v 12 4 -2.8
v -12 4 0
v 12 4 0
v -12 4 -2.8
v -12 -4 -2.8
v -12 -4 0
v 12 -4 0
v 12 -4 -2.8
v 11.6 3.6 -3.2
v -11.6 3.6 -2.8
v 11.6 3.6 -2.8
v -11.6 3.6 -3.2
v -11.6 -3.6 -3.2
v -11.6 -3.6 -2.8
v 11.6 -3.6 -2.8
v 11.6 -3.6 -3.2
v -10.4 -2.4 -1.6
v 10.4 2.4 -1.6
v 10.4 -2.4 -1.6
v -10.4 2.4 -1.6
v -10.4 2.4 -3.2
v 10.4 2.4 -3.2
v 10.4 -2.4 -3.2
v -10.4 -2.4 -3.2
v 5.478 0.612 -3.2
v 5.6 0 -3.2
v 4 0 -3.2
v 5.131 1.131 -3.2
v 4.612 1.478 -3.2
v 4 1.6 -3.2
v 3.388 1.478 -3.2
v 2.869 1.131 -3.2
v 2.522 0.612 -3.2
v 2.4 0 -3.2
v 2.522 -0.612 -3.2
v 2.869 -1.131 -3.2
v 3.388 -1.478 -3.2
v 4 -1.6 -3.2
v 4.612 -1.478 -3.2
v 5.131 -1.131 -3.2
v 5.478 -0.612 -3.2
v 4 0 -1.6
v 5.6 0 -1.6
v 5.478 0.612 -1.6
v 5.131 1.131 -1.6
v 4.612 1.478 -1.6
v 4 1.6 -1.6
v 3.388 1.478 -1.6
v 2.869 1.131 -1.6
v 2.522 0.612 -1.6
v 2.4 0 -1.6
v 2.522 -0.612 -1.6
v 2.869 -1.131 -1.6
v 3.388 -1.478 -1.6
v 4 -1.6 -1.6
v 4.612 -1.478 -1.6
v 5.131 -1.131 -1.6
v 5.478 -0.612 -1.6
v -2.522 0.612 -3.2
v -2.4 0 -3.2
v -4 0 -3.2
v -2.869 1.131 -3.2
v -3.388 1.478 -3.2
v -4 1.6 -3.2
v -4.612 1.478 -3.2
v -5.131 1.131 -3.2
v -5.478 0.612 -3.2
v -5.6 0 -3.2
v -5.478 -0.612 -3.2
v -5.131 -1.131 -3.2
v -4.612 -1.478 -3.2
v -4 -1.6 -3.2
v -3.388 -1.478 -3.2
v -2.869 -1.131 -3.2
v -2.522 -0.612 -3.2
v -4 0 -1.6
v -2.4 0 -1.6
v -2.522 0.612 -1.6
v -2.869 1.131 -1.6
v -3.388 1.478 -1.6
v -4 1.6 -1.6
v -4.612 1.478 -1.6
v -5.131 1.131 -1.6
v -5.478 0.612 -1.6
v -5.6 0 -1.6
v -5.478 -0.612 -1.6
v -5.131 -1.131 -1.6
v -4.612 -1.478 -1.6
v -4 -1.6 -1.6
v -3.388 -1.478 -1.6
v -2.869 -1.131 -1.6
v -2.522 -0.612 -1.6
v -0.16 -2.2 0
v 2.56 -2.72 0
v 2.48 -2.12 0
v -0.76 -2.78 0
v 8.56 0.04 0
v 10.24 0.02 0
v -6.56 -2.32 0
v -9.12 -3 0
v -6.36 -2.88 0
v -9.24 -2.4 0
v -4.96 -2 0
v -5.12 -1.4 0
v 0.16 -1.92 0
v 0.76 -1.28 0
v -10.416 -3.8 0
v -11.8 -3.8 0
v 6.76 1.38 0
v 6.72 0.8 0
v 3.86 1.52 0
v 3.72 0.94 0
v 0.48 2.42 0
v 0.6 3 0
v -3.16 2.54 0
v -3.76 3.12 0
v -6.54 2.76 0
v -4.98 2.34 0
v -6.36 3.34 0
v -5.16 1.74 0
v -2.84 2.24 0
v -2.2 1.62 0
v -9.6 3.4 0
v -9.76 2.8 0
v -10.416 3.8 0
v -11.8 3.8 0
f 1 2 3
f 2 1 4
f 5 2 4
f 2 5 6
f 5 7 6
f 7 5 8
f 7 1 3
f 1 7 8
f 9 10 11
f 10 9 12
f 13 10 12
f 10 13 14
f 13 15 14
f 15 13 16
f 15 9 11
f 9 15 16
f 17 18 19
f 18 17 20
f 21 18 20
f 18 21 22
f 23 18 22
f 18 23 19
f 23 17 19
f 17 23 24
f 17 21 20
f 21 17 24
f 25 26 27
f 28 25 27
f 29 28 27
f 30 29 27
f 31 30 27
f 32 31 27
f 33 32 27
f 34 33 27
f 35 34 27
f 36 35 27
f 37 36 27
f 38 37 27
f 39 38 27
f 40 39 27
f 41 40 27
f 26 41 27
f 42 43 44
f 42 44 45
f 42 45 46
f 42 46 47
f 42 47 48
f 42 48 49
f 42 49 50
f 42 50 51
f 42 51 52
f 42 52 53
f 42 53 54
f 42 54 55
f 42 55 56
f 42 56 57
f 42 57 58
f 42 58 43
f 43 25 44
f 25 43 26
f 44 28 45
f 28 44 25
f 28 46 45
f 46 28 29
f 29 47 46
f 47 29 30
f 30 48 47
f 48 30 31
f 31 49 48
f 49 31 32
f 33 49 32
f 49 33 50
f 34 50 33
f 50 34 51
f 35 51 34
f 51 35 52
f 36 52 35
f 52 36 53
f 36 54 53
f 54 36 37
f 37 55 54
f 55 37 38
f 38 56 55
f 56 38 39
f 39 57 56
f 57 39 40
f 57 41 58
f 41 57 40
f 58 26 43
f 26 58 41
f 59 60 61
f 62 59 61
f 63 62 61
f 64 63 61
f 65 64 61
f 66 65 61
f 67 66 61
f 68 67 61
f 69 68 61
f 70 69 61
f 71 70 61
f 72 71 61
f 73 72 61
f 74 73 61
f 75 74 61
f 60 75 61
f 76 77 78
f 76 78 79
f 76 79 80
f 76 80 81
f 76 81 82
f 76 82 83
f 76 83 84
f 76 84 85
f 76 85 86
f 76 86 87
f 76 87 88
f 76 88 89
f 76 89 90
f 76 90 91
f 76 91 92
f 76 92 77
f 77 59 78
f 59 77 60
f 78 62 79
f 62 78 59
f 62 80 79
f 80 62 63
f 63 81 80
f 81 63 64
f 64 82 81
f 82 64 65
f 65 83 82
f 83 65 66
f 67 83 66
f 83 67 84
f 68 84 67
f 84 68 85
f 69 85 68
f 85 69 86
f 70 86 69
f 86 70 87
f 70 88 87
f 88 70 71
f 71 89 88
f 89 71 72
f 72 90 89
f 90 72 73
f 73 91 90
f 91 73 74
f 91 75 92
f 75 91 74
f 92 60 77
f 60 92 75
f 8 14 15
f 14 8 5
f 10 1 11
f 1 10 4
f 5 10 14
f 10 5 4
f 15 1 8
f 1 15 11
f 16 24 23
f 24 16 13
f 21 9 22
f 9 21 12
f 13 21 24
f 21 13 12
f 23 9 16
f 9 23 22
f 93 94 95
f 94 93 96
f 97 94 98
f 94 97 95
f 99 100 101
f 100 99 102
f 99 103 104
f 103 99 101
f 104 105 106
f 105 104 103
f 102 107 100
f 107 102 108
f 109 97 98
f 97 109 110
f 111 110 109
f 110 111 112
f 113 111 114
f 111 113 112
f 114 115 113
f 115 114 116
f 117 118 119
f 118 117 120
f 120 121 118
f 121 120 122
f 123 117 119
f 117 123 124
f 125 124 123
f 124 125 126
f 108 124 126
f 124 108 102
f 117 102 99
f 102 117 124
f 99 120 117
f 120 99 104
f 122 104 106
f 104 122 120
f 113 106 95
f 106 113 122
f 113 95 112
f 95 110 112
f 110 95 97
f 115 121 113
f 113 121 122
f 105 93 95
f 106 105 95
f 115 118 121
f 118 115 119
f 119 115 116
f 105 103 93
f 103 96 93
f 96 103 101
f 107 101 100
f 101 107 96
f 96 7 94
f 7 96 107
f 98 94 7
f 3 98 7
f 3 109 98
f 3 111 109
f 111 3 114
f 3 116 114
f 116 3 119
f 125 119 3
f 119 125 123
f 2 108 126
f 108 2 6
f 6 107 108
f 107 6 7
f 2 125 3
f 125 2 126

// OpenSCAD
// file: ../p/4-4edge.scad
use <../lib.scad>
function ldraw_lib__4_4edge() = [
// 0 Circle 1.0
// 0 Name: 4-4edge.dat
// 0 Author: James Jessiman
// 0 !LDRAW_ORG Primitive UPDATE 2017-01
// 0 !LICENSE Licensed under CC BY 2.0 and CC BY 4.0 : see CAreadme.txt
// 
// 0 BFC CERTIFY CCW
  [0,"BFC","CERTIFY"],
  [0,"BFC","CCW"],
// 
// 0 !HISTORY 1998-12-15 [PTadmin] Official Update 1998-10
// 0 !HISTORY 2005-12-28 [PTadmin] Official Update 2005-01
// 0 !HISTORY 2007-06-24 [PTadmin] Header formatted for Contributor Agreement
// 0 !HISTORY 2008-07-01 [PTadmin] Official Update 2008-01
// 0 !HISTORY 2017-01-15 [Steffen] BFCed
// 0 !HISTORY 2017-12-30 [PTadmin] Official Update 2017-01
// 
// 
// 2 24 1 0 0 0.9239 0 0.3827
  [2,24,1,0,0,0.9239,0,0.3827],
// 2 24 0.9239 0 0.3827 0.7071 0 0.7071
  [2,24,0.9239,0,0.3827,0.7071,0,0.7071],
// 2 24 0.7071 0 0.7071 0.3827 0 0.9239
  [2,24,0.7071,0,0.7071,0.3827,0,0.9239],
// 2 24 0.3827 0 0.9239 0 0 1
  [2,24,0.3827,0,0.9239,0,0,1],
// 2 24 0 0 1 -0.3827 0 0.9239
  [2,24,0,0,1,-0.3827,0,0.9239],
// 2 24 -0.3827 0 0.9239 -0.7071 0 0.7071
  [2,24,-0.3827,0,0.9239,-0.7071,0,0.7071],
// 2 24 -0.7071 0 0.7071 -0.9239 0 0.3827
  [2,24,-0.7071,0,0.7071,-0.9239,0,0.3827],
// 2 24 -0.9239 0 0.3827 -1 0 -0
  [2,24,-0.9239,0,0.3827,-1,0,-0],
// 2 24 -1 0 -0 -0.9239 0 -0.3827
  [2,24,-1,0,-0,-0.9239,0,-0.3827],
// 2 24 -0.9239 0 -0.3827 -0.7071 0 -0.7071
  [2,24,-0.9239,0,-0.3827,-0.7071,0,-0.7071],
// 2 24 -0.7071 0 -0.7071 -0.3827 0 -0.9239
  [2,24,-0.7071,0,-0.7071,-0.3827,0,-0.9239],
// 2 24 -0.3827 0 -0.9239 0 0 -1
  [2,24,-0.3827,0,-0.9239,0,0,-1],
// 2 24 0 0 -1 0.3827 0 -0.9239
  [2,24,0,0,-1,0.3827,0,-0.9239],
// 2 24 0.3827 0 -0.9239 0.7071 0 -0.7071
  [2,24,0.3827,0,-0.9239,0.7071,0,-0.7071],
// 2 24 0.7071 0 -0.7071 0.9239 0 -0.3827
  [2,24,0.7071,0,-0.7071,0.9239,0,-0.3827],
// 2 24 0.9239 0 -0.3827 1 0 0
  [2,24,0.9239,0,-0.3827,1,0,0],
];
module ldraw_lib__4_4edge(step=0, col=false, unit=2/5, alt=false, line=0.2, solid=!$preview)
    makepoly(ldraw_lib__4_4edge(), step=step, col=col, unit=unit, alt=alt, line=line, solid=solid);
ldraw_lib__4_4edge(line=0.2);
// file: ../p/4-4disc.scad
use <../lib.scad>
function ldraw_lib__4_4disc() = [
// 0 Disc 1.0
// 0 Name: 4-4disc.dat
// 0 Author: James Jessiman
// 0 !LDRAW_ORG Primitive UPDATE 2002-02
// 0 !LICENSE Licensed under CC BY 2.0 and CC BY 4.0 : see CAreadme.txt
// 
// 0 BFC CERTIFY CCW
  [0,"BFC","CERTIFY"],
  [0,"BFC","CCW"],
// 
// 0 !HISTORY 1998-12-15 [PTadmin] Official Update 1998-10
// 0 !HISTORY 2002-03-23 [sbliss] Added BFC statement
// 0 !HISTORY 2002-04-25 [PTadmin] Official Update 2002-02
// 0 !HISTORY 2007-06-24 [PTadmin] Header formatted for Contributor Agreement
// 0 !HISTORY 2008-07-01 [PTadmin] Official Update 2008-01
// 
// 
// 3 16 0 0 0 1 0 0 0.9239 0 0.3827
  [3,16,0,0,0,1,0,0,0.9239,0,0.3827],
// 3 16 0 0 0 0.9239 0 0.3827 0.7071 0 0.7071
  [3,16,0,0,0,0.9239,0,0.3827,0.7071,0,0.7071],
// 3 16 0 0 0 0.7071 0 0.7071 0.3827 0 0.9239
  [3,16,0,0,0,0.7071,0,0.7071,0.3827,0,0.9239],
// 3 16 0 0 0 0.3827 0 0.9239 0 0 1
  [3,16,0,0,0,0.3827,0,0.9239,0,0,1],
// 3 16 0 0 0 0 0 1 -0.3827 0 0.9239
  [3,16,0,0,0,0,0,1,-0.3827,0,0.9239],
// 3 16 0 0 0 -0.3827 0 0.9239 -0.7071 0 0.7071
  [3,16,0,0,0,-0.3827,0,0.9239,-0.7071,0,0.7071],
// 3 16 0 0 0 -0.7071 0 0.7071 -0.9239 0 0.3827
  [3,16,0,0,0,-0.7071,0,0.7071,-0.9239,0,0.3827],
// 3 16 0 0 0 -0.9239 0 0.3827 -1 0 -0
  [3,16,0,0,0,-0.9239,0,0.3827,-1,0,-0],
// 3 16 0 0 0 -1 0 -0 -0.9239 0 -0.3827
  [3,16,0,0,0,-1,0,-0,-0.9239,0,-0.3827],
// 3 16 0 0 0 -0.9239 0 -0.3827 -0.7071 0 -0.7071
  [3,16,0,0,0,-0.9239,0,-0.3827,-0.7071,0,-0.7071],
// 3 16 0 0 0 -0.7071 0 -0.7071 -0.3827 0 -0.9239
  [3,16,0,0,0,-0.7071,0,-0.7071,-0.3827,0,-0.9239],
// 3 16 0 0 0 -0.3827 0 -0.9239 0 0 -1
  [3,16,0,0,0,-0.3827,0,-0.9239,0,0,-1],
// 3 16 0 0 0 0 0 -1 0.3827 0 -0.9239
  [3,16,0,0,0,0,0,-1,0.3827,0,-0.9239],
// 3 16 0 0 0 0.3827 0 -0.9239 0.7071 0 -0.7071
  [3,16,0,0,0,0.3827,0,-0.9239,0.7071,0,-0.7071],
// 3 16 0 0 0 0.7071 0 -0.7071 0.9239 0 -0.3827
  [3,16,0,0,0,0.7071,0,-0.7071,0.9239,0,-0.3827],
// 3 16 0 0 0 0.9239 0 -0.3827 1 0 0
  [3,16,0,0,0,0.9239,0,-0.3827,1,0,0],
// 0
];
module ldraw_lib__4_4disc(step=0, col=false, unit=2/5, alt=false, line=0.2, solid=!$preview)
    makepoly(ldraw_lib__4_4disc(), step=step, col=col, unit=unit, alt=alt, line=line, solid=solid);
ldraw_lib__4_4disc(line=0.2);
// file: ../p/4-4cyli.scad
use <../lib.scad>
$fa=1; $fs=0.2;
function ldraw_lib__4_4cyli(realsolid=false) = [
// 0 Cylinder 1.0
// 0 Name: 4-4cyli.dat
// 0 Author: James Jessiman
// 0 !LDRAW_ORG Primitive UPDATE 2005-01
// 0 !LICENSE Licensed under CC BY 2.0 and CC BY 4.0 : see CAreadme.txt
// 
// 0 BFC CERTIFY CCW
  [0,"BFC","CERTIFY"],
  [0,"BFC","CCW"],
// 
// 0 !HISTORY 1998-12-15 [PTadmin] Official Update 1998-10
// 0 !HISTORY 2002-03-23 [sbliss] Added BFC statement; merged headers from files in distributions LDraw 0.27 and Complete.
// 0 !HISTORY 2002-04-25 [PTadmin] Official Update 2002-02
// 0 !HISTORY 2004-12-14 [guyvivan] BFC CCW
// 0 !HISTORY 2005-12-28 [PTadmin] Official Update 2005-01
// 0 !HISTORY 2007-06-24 [PTadmin] Header formatted for Contributor Agreement
// 0 !HISTORY 2008-07-01 [PTadmin] Official Update 2008-01
// 
// 
// 4 16 1 1 0 0.9239 1 0.3827 0.9239 0 0.3827 1 0 0
  [4,16,1,1,0,0.9239,1,0.3827,0.9239,0,0.3827,1,0,0],
// 5 24 1 0 0 1 1 0 0.9239 0 0.3827 0.9239 0 -0.3827
  [5,24,1,0,0,1,1,0,0.9239,0,0.3827,0.9239,0,-0.3827],
// 4 16 0.9239 1 0.3827 0.7071 1 0.7071 0.7071 0 0.7071 0.9239 0 0.3827
  [4,16,0.9239,1,0.3827,0.7071,1,0.7071,0.7071,0,0.7071,0.9239,0,0.3827],
// 5 24 0.9239 0 0.3827 0.9239 1 0.3827 0.7071 0 0.7071 1 0 0
  [5,24,0.9239,0,0.3827,0.9239,1,0.3827,0.7071,0,0.7071,1,0,0],
// 4 16 0.7071 1 0.7071 0.3827 1 0.9239 0.3827 0 0.9239 0.7071 0 0.7071
  [4,16,0.7071,1,0.7071,0.3827,1,0.9239,0.3827,0,0.9239,0.7071,0,0.7071],
// 5 24 0.7071 0 0.7071 0.7071 1 0.7071 0.3827 0 0.9239 0.9239 0 0.3827
  [5,24,0.7071,0,0.7071,0.7071,1,0.7071,0.3827,0,0.9239,0.9239,0,0.3827],
// 4 16 0.3827 1 0.9239 0 1 1 0 0 1 0.3827 0 0.9239
  [4,16,0.3827,1,0.9239,0,1,1,0,0,1,0.3827,0,0.9239],
// 5 24 0.3827 0 0.9239 0.3827 1 0.9239 0 0 1 0.7071 0 0.7071
  [5,24,0.3827,0,0.9239,0.3827,1,0.9239,0,0,1,0.7071,0,0.7071],
// 4 16 0 1 1 -0.3827 1 0.9239 -0.3827 0 0.9239 0 0 1
  [4,16,0,1,1,-0.3827,1,0.9239,-0.3827,0,0.9239,0,0,1],
// 5 24 0 0 1 0 1 1 -0.3827 0 0.9239 0.3827 0 0.9239
  [5,24,0,0,1,0,1,1,-0.3827,0,0.9239,0.3827,0,0.9239],
// 4 16 -0.3827 1 0.9239 -0.7071 1 0.7071 -0.7071 0 0.7071 -0.3827 0 0.9239
  [4,16,-0.3827,1,0.9239,-0.7071,1,0.7071,-0.7071,0,0.7071,-0.3827,0,0.9239],
// 5 24 -0.3827 0 0.9239 -0.3827 1 0.9239 -0.7071 0 0.7071 0 0 1
  [5,24,-0.3827,0,0.9239,-0.3827,1,0.9239,-0.7071,0,0.7071,0,0,1],
// 4 16 -0.7071 1 0.7071 -0.9239 1 0.3827 -0.9239 0 0.3827 -0.7071 0 0.7071
  [4,16,-0.7071,1,0.7071,-0.9239,1,0.3827,-0.9239,0,0.3827,-0.7071,0,0.7071],
// 5 24 -0.7071 0 0.7071 -0.7071 1 0.7071 -0.9239 0 0.3827 -0.3827 0 0.9239
  [5,24,-0.7071,0,0.7071,-0.7071,1,0.7071,-0.9239,0,0.3827,-0.3827,0,0.9239],
// 4 16 -0.9239 1 0.3827 -1 1 0 -1 0 0 -0.9239 0 0.3827
  [4,16,-0.9239,1,0.3827,-1,1,0,-1,0,0,-0.9239,0,0.3827],
// 5 24 -0.9239 0 0.3827 -0.9239 1 0.3827 -1 0 0 -0.7071 0 0.7071
  [5,24,-0.9239,0,0.3827,-0.9239,1,0.3827,-1,0,0,-0.7071,0,0.7071],
// 4 16 -1 1 0 -0.9239 1 -0.3827 -0.9239 0 -0.3827 -1 0 0
  [4,16,-1,1,0,-0.9239,1,-0.3827,-0.9239,0,-0.3827,-1,0,0],
// 5 24 -1 0 0 -1 1 0 -0.9239 0 -0.3827 -0.9239 0 0.3827
  [5,24,-1,0,0,-1,1,0,-0.9239,0,-0.3827,-0.9239,0,0.3827],
// 4 16 -0.9239 1 -0.3827 -0.7071 1 -0.7071 -0.7071 0 -0.7071 -0.9239 0 -0.3827
  [4,16,-0.9239,1,-0.3827,-0.7071,1,-0.7071,-0.7071,0,-0.7071,-0.9239,0,-0.3827],
// 5 24 -0.9239 0 -0.3827 -0.9239 1 -0.3827 -0.7071 0 -0.7071 -1 0 0
  [5,24,-0.9239,0,-0.3827,-0.9239,1,-0.3827,-0.7071,0,-0.7071,-1,0,0],
// 4 16 -0.7071 1 -0.7071 -0.3827 1 -0.9239 -0.3827 0 -0.9239 -0.7071 0 -0.7071
  [4,16,-0.7071,1,-0.7071,-0.3827,1,-0.9239,-0.3827,0,-0.9239,-0.7071,0,-0.7071],
// 5 24 -0.7071 0 -0.7071 -0.7071 1 -0.7071 -0.3827 0 -0.9239 -0.9239 0 -0.3827
  [5,24,-0.7071,0,-0.7071,-0.7071,1,-0.7071,-0.3827,0,-0.9239,-0.9239,0,-0.3827],
// 4 16 -0.3827 1 -0.9239 0 1 -1 0 0 -1 -0.3827 0 -0.9239
  [4,16,-0.3827,1,-0.9239,0,1,-1,0,0,-1,-0.3827,0,-0.9239],
// 5 24 -0.3827 0 -0.9239 -0.3827 1 -0.9239 0 0 -1 -0.7071 0 -0.7071
  [5,24,-0.3827,0,-0.9239,-0.3827,1,-0.9239,0,0,-1,-0.7071,0,-0.7071],
// 4 16 0 1 -1 0.3827 1 -0.9239 0.3827 0 -0.9239 0 0 -1
  [4,16,0,1,-1,0.3827,1,-0.9239,0.3827,0,-0.9239,0,0,-1],
// 5 24 0 0 -1 0 1 -1 0.3827 0 -0.9239 -0.3827 0 -0.9239
  [5,24,0,0,-1,0,1,-1,0.3827,0,-0.9239,-0.3827,0,-0.9239],
// 4 16 0.3827 1 -0.9239 0.7071 1 -0.7071 0.7071 0 -0.7071 0.3827 0 -0.9239
  [4,16,0.3827,1,-0.9239,0.7071,1,-0.7071,0.7071,0,-0.7071,0.3827,0,-0.9239],
// 5 24 0.3827 0 -0.9239 0.3827 1 -0.9239 0.7071 0 -0.7071 0 0 -1
  [5,24,0.3827,0,-0.9239,0.3827,1,-0.9239,0.7071,0,-0.7071,0,0,-1],
// 4 16 0.7071 1 -0.7071 0.9239 1 -0.3827 0.9239 0 -0.3827 0.7071 0 -0.7071
  [4,16,0.7071,1,-0.7071,0.9239,1,-0.3827,0.9239,0,-0.3827,0.7071,0,-0.7071],
// 5 24 0.7071 0 -0.7071 0.7071 1 -0.7071 0.9239 0 -0.3827 0.3827 0 -0.9239
  [5,24,0.7071,0,-0.7071,0.7071,1,-0.7071,0.9239,0,-0.3827,0.3827,0,-0.9239],
// 4 16 0.9239 1 -0.3827 1 1 0 1 0 0 0.9239 0 -0.3827
  [4,16,0.9239,1,-0.3827,1,1,0,1,0,0,0.9239,0,-0.3827],
// 5 24 0.9239 0 -0.3827 0.9239 1 -0.3827 1 0 0 0.7071 0 -0.7071
  [5,24,0.9239,0,-0.3827,0.9239,1,-0.3827,1,0,0,0.7071,0,-0.7071],
// 0
];
module ldraw_lib__4_4cyli(step=0, col=false, unit=2/5, alt=false, line=0.2, solid=!$preview)
    makepoly(ldraw_lib__4_4cyli(solid), step=step, col=col, unit=unit, alt=alt, line=line, solid=solid);
ldraw_lib__4_4cyli(line=0.2);
// file: ../p/stud3.scad
use <../lib.scad>
use <4-4cyli.scad>
use <4-4disc.scad>
use <4-4edge.scad>
function ldraw_lib__stud3() = [
// 0 Stud Tube Solid
// 0 Name: stud3.dat
// 0 Author: James Jessiman
// 0 !LDRAW_ORG Primitive UPDATE 2012-01
// 0 !LICENSE Licensed under CC BY 4.0 : see CAreadme.txt
// 
// 0 BFC CERTIFY CCW
  [0,"BFC","CERTIFY"],
  [0,"BFC","CCW"],
// 
// 0 !HISTORY 2002-04-04 [sbliss] Modified for BFC compliance
// 0 !HISTORY 2002-04-25 [PTadmin] Official Update 2002-02
// 0 !HISTORY 2007-06-24 [PTadmin] Header formatted for Contributor Agreement
// 0 !HISTORY 2008-07-01 [PTadmin] Official Update 2008-01
// 0 !HISTORY 2012-02-16 [Philo] Changed to CCW
// 0 !HISTORY 2012-03-30 [PTadmin] Official Update 2012-01
// 
// 
// 1 16 0 -4 0 4 0 0 0 1 0 0 0 4 4-4edge.dat
  [1,16,0,-4,0,4,0,0,0,1,0,0,0,4, ldraw_lib__4_4edge()],
// 1 16 0 0 0 4 0 0 0 1 0 0 0 4 4-4edge.dat
  [1,16,0,0,0,4,0,0,0,1,0,0,0,4, ldraw_lib__4_4edge()],
// 1 16 0 -4 0 4 0 0 0 1 0 0 0 4 4-4disc.dat
  [1,16,0,-4,0,4,0,0,0,1,0,0,0,4, ldraw_lib__4_4disc()],
  [-1,16,0,0,0,4,0,0,0,-1,0,0,0,4, ldraw_lib__4_4disc()],
// 1 16 0 -4 0 4 0 0 0 4 0 0 0 4 4-4cyli.dat
  [1,16,0,-4,0,4,0,0,0,4,0,0,0,4, ldraw_lib__4_4cyli()],
];
module ldraw_lib__stud3(step=0, col=false, unit=2/5, alt=false, line=0.2, solid=!$preview)
    makepoly(ldraw_lib__stud3(), step=step, col=col, unit=unit, alt=alt, line=line, solid=solid);
ldraw_lib__stud3(line=0.2);
// file: ../p/box5.scad
use <../lib.scad>
function ldraw_lib__box5() = [
// 0 Box with 5 Faces and All Edges
// 0 Name: box5.dat
// 0 Author: James Jessiman
// 0 !LDRAW_ORG Primitive UPDATE 2012-01
// 0 !LICENSE Licensed under CC BY 2.0 and CC BY 4.0 : see CAreadme.txt
// 
// 0 BFC CERTIFY CCW
  [0,"BFC","CERTIFY"],
  [0,"BFC","CCW"],
// 
// 0 !HISTORY 2002-04-03 [sbliss] Modified for BFC compliance
// 0 !HISTORY 2002-04-25 [PTadmin] Official Update 2002-02
// 0 !HISTORY 2007-06-24 [PTadmin] Header formatted for Contributor Agreement
// 0 !HISTORY 2008-07-01 [PTadmin] Official Update 2008-01
// 0 !HISTORY 2012-02-16 [Philo] Changed to CCW
// 0 !HISTORY 2012-03-30 [PTadmin] Official Update 2012-01
// 
// 
// 2 24 1 1 1 -1 1 1
  [2,24,1,1,1,-1,1,1],
// 2 24 -1 1 1 -1 1 -1
  [2,24,-1,1,1,-1,1,-1],
// 2 24 -1 1 -1 1 1 -1
  [2,24,-1,1,-1,1,1,-1],
// 2 24 1 1 -1 1 1 1
  [2,24,1,1,-1,1,1,1],
// 2 24 1 0 1 -1 0 1
  [2,24,1,0,1,-1,0,1],
// 2 24 -1 0 1 -1 0 -1
  [2,24,-1,0,1,-1,0,-1],
// 2 24 -1 0 -1 1 0 -1
  [2,24,-1,0,-1,1,0,-1],
// 2 24 1 0 -1 1 0 1
  [2,24,1,0,-1,1,0,1],
// 2 24 1 0 1 1 1 1
  [2,24,1,0,1,1,1,1],
// 2 24 -1 0 1 -1 1 1
  [2,24,-1,0,1,-1,1,1],
// 2 24 1 0 -1 1 1 -1
  [2,24,1,0,-1,1,1,-1],
// 2 24 -1 0 -1 -1 1 -1
  [2,24,-1,0,-1,-1,1,-1],
// 4 16 -1 1 1 1 1 1 1 1 -1 -1 1 -1
  [4,16,-1,1,1,1,1,1,1,1,-1,-1,1,-1],
// 4 16 -1 1 1 -1 0 1 1 0 1 1 1 1
  [4,16,-1,1,1,-1,0,1,1,0,1,1,1,1],
// 4 16 -1 1 -1 -1 0 -1 -1 0 1 -1 1 1
  [4,16,-1,1,-1,-1,0,-1,-1,0,1,-1,1,1],
// 4 16 1 1 -1 1 0 -1 -1 0 -1 -1 1 -1
  [4,16,1,1,-1,1,0,-1,-1,0,-1,-1,1,-1],
// 4 16 1 1 1 1 0 1 1 0 -1 1 1 -1
  [4,16,1,1,1,1,0,1,1,0,-1,1,1,-1],
];
makepoly(ldraw_lib__box5(), line=0.2);
// file: ../p/box4.scad
use <../lib.scad>
function ldraw_lib__box4() = [
// 0 Box with 4 Faces (2 Parallel Pairs) and All Edges
// 0 Name: box4.dat
// 0 Author: James Jessiman
// 0 !LDRAW_ORG Primitive UPDATE 2012-01
// 0 !LICENSE Licensed under CC BY 4.0 : see CAreadme.txt
// 
// 0 BFC CERTIFY CCW
  [0,"BFC","CERTIFY"],
  [0,"BFC","CCW"],
// 
// 0 !HISTORY 2002-04-03 [sbliss] Modified for BFC compliance
// 0 !HISTORY 2002-04-25 [PTadmin] Official Update 2002-02
// 0 !HISTORY 2007-06-24 [PTadmin] Header formatted for Contributor Agreement
// 0 !HISTORY 2008-07-01 [PTadmin] Official Update 2008-01
// 0 !HISTORY 2012-02-16 [Philo] Changed to CCW
// 0 !HISTORY 2012-03-30 [PTadmin] Official Update 2012-01
// 
// 
// 2 24 1 1 1 -1 1 1
  [2,24,1,1,1,-1,1,1],
// 2 24 -1 1 1 -1 1 -1
  [2,24,-1,1,1,-1,1,-1],
// 2 24 -1 1 -1 1 1 -1
  [2,24,-1,1,-1,1,1,-1],
// 2 24 1 1 -1 1 1 1
  [2,24,1,1,-1,1,1,1],
// 2 24 1 0 1 -1 0 1
  [2,24,1,0,1,-1,0,1],
// 2 24 -1 0 1 -1 0 -1
  [2,24,-1,0,1,-1,0,-1],
// 2 24 -1 0 -1 1 0 -1
  [2,24,-1,0,-1,1,0,-1],
// 2 24 1 0 -1 1 0 1
  [2,24,1,0,-1,1,0,1],
// 2 24 1 0 1 1 1 1
  [2,24,1,0,1,1,1,1],
// 2 24 -1 0 1 -1 1 1
  [2,24,-1,0,1,-1,1,1],
// 2 24 1 0 -1 1 1 -1
  [2,24,1,0,-1,1,1,-1],
// 2 24 -1 0 -1 -1 1 -1
  [2,24,-1,0,-1,-1,1,-1],
// 4 16 -1 1 1 -1 0 1 1 0 1 1 1 1
  [4,16,-1,1,1,-1,0,1,1,0,1,1,1,1],
// 4 16 -1 1 -1 -1 0 -1 -1 0 1 -1 1 1
  [4,16,-1,1,-1,-1,0,-1,-1,0,1,-1,1,1],
// 4 16 1 1 -1 1 0 -1 -1 0 -1 -1 1 -1
  [4,16,1,1,-1,1,0,-1,-1,0,-1,-1,1,-1],
// 4 16 1 1 1 1 0 1 1 0 -1 1 1 -1
  [4,16,1,1,1,1,0,1,1,0,-1,1,1,-1],
];
module ldraw_lib__box4(step=0, col=false, unit=2/5, alt=false, line=0.2, solid=!$preview)
    makepoly(ldraw_lib__box4(), step=step, col=col, unit=unit, alt=alt, line=line, solid=solid);
ldraw_lib__box4(line=0.2);
// file: s/63864s01.scad
use <../../lib.scad>
use <../../p/box4.scad>
use <../../p/box5.scad>
use <../../p/stud3.scad>
function ldraw_lib__s__63864s01() = [
// 0 ~Tile  1 x  3 without Top Face
// 0 Name: s\63864s01.dat
// 0 Author: Ulrich Röder [UR]
// 0 !LDRAW_ORG Subpart UPDATE 2019-01
// 0 !LICENSE Licensed under CC BY 4.0 : see CAreadme.txt
// 
// 0 BFC CERTIFY CCW
  [0,"BFC","CERTIFY"],
  [0,"BFC","CCW"],
// 
// 0 !HISTORY 2019-06-28 [PTadmin] Official Update 2019-01
// 
// 
// 1 16 0 0 0 30 0 0 0 7 0 0 0 10 box4.dat
  [1,16,0,0,0,30,0,0,0,7,0,0,0,10, ldraw_lib__box4()],
// 1 16 0 7 0 29 0 0 0 1 0 0 0 9 box4.dat
  [1,16,0,7,0,29,0,0,0,1,0,0,0,9, ldraw_lib__box4()],
// 0 BFC INVERTNEXT
  [0,"BFC","INVERTNEXT"],
// 1 16 0 8 0 -26 0 0 0 -4 0 0 0 6 box5.dat
  [1,16,0,8,0,-26,0,0,0,-4,0,0,0,6, ldraw_lib__box5()],
// 1 16 10 4 0 1 0 0 0 -1 0 0 0 1 stud3.dat
  [1,16,10,4,0,1,0,0,0,-1,0,0,0,1, ldraw_lib__stud3()],
// 1 16 -10 4 0 1 0 0 0 -1 0 0 0 1 stud3.dat
  [1,16,-10,4,0,1,0,0,0,-1,0,0,0,1, ldraw_lib__stud3()],
// 4 16 -30 7 -10 -29 7 -9 29 7 -9 30 7 -10
  [4,16,-30,7,-10,-29,7,-9,29,7,-9,30,7,-10],
// 4 16 30 7 10 29 7 9 -29 7 9 -30 7 10
  [4,16,30,7,10,29,7,9,-29,7,9,-30,7,10],
// 4 16 -30 7 -10 -30 7 10 -29 7 9 -29 7 -9
  [4,16,-30,7,-10,-30,7,10,-29,7,9,-29,7,-9],
// 4 16 30 7 10 30 7 -10 29 7 -9 29 7 9
  [4,16,30,7,10,30,7,-10,29,7,-9,29,7,9],
// 4 16 -29 8 -9 -26 8 -6 26 8 -6 29 8 -9
  [4,16,-29,8,-9,-26,8,-6,26,8,-6,29,8,-9],
// 4 16 29 8 9 26 8 6 -26 8 6 -29 8 9
  [4,16,29,8,9,26,8,6,-26,8,6,-29,8,9],
// 4 16 -29 8 -9 -29 8 9 -26 8 6 -26 8 -6
  [4,16,-29,8,-9,-29,8,9,-26,8,6,-26,8,-6],
// 4 16 29 8 9 29 8 -9 26 8 -6 26 8 6
  [4,16,29,8,9,29,8,-9,26,8,-6,26,8,6],
];
module ldraw_lib__s__63864s01(step=0, col=false, unit=2/5, alt=false, line=0.2, solid=!$preview)
    makepoly(ldraw_lib__s__63864s01(), step=step, col=col, unit=unit, alt=alt, line=line, solid=solid);
ldraw_lib__s__63864s01(line=0.2);
// main file
use <../lib.scad>
use <s/63864s01.scad>
function ldraw_lib__63864p0a() = [
// 0 Tile  1 x  3 with Black Energy Bolt with Dark Pink Border Pattern
// 0 Name: 63864p0a.dat
// 0 Author: Bertrand Lequy [Berth]
// 0 !LDRAW_ORG Part UPDATE 2024-06
// 0 !LICENSE Licensed under CC BY 4.0 : see CAreadme.txt
// 
// 0 BFC CERTIFY CCW
  [0,"BFC","CERTIFY"],
  [0,"BFC","CCW"],
// 
// 0 !KEYWORDS Bricklink 63864pb248, Brickowl 937685, Rebrickable 63864pr0051
// 0 !KEYWORDS set 60400
// 
// 0 !HISTORY 2024-07-29 [OrionP] Official Update 2024-06
// 
// 1 16 0 0 0 1 0 0 0 1 0 0 0 1 s\63864s01.dat
  [1,16,0,0,0,1,0,0,0,1,0,0,0,1, ldraw_lib__s__63864s01()],
// 4 5 -0.4 0 -5.5 -1.9 0 -6.95 6.4 0 -6.8 6.2 0 -5.3
  [4,5,-0.4,0,-5.5,-1.9,0,-6.95,6.4,0,-6.8,6.2,0,-5.3],
// 4 5 21.4 0 0.1 6.2 0 -5.3 6.4 0 -6.8 25.6 0 0.05
  [4,5,21.4,0,0.1,6.2,0,-5.3,6.4,0,-6.8,25.6,0,0.05],
// 4 5 -23.1 0 -6 -22.8 0 -7.5 -15.9 0 -7.2 -16.4 0 -5.8
  [4,5,-23.1,0,-6,-22.8,0,-7.5,-15.9,0,-7.2,-16.4,0,-5.8],
// 4 5 -12.4 0 -5 -12.8 0 -3.5 -16.4 0 -5.8 -15.9 0 -7.2
  [4,5,-12.4,0,-5,-12.8,0,-3.5,-16.4,0,-5.8,-15.9,0,-7.2],
// 4 5 -12.8 0 -3.5 -12.4 0 -5 0.4 0 -4.8 1.9 0 -3.2
  [4,5,-12.8,0,-3.5,-12.4,0,-5,0.4,0,-4.8,1.9,0,-3.2],
// 4 5 -23.1 0 -6 -29.5 0 -9.5 -26.04 0 -9.5 -22.8 0 -7.5
  [4,5,-23.1,0,-6,-29.5,0,-9.5,-26.04,0,-9.5,-22.8,0,-7.5],
// 4 5 16.8 0 2 21.4 0 0.1 25.6 0 0.05 16.9 0 3.45
  [4,5,16.8,0,2,21.4,0,0.1,25.6,0,0.05,16.9,0,3.45],
// 4 5 9.65 0 3.8 9.3 0 2.35 16.8 0 2 16.9 0 3.45
  [4,5,9.65,0,3.8,9.3,0,2.35,16.8,0,2,16.9,0,3.45],
// 4 5 1.2 0 6.05 9.3 0 2.35 9.65 0 3.8 1.5 0 7.5
  [4,5,1.2,0,6.05,9.3,0,2.35,9.65,0,3.8,1.5,0,7.5],
// 4 5 -9.4 0 7.8 -7.9 0 6.35 1.2 0 6.05 1.5 0 7.5
  [4,5,-9.4,0,7.8,-7.9,0,6.35,1.2,0,6.05,1.5,0,7.5],
// 4 5 -16.35 0 6.9 -12.9 0 4.35 -12.45 0 5.85 -15.9 0 8.35
  [4,5,-16.35,0,6.9,-12.9,0,4.35,-12.45,0,5.85,-15.9,0,8.35],
// 4 5 -12.45 0 5.85 -12.9 0 4.35 -5.5 0 4.05 -7.1 0 5.6
  [4,5,-12.45,0,5.85,-12.9,0,4.35,-5.5,0,4.05,-7.1,0,5.6],
// 4 5 -24 0 8.5 -24.4 0 7 -16.35 0 6.9 -15.9 0 8.35
  [4,5,-24,0,8.5,-24.4,0,7,-16.35,0,6.9,-15.9,0,8.35],
// 4 5 -29.5 0 9.5 -24.4 0 7 -24 0 8.5 -26.04 0 9.5
  [4,5,-29.5,0,9.5,-24.4,0,7,-24,0,8.5,-26.04,0,9.5],
// 4 0 -24.4 0 7 -29.5 0 9.5 -29.5 0 -9.5 -23.1 0 -6
  [4,0,-24.4,0,7,-29.5,0,9.5,-29.5,0,-9.5,-23.1,0,-6],
// 4 0 -16.35 0 6.9 -24.4 0 7 -23.1 0 -6 -16.4 0 -5.8
  [4,0,-16.35,0,6.9,-24.4,0,7,-23.1,0,-6,-16.4,0,-5.8],
// 4 0 -12.9 0 4.35 -16.35 0 6.9 -16.4 0 -5.8 -12.8 0 -3.5
  [4,0,-12.9,0,4.35,-16.35,0,6.9,-16.4,0,-5.8,-12.8,0,-3.5],
// 4 0 -5.5 0 4.05 -12.9 0 4.35 -12.8 0 -3.5 1.9 0 -3.2
  [4,0,-5.5,0,4.05,-12.9,0,4.35,-12.8,0,-3.5,1.9,0,-3.2],
// 4 0 1.2 0 6.05 -5.5 0 4.05 1.9 0 -3.2 6.2 0 -5.3
  [4,0,1.2,0,6.05,-5.5,0,4.05,1.9,0,-3.2,6.2,0,-5.3],
// 3 0 1.2 0 6.05 6.2 0 -5.3 9.3 0 2.35
  [3,0,1.2,0,6.05,6.2,0,-5.3,9.3,0,2.35],
// 4 0 16.8 0 2 9.3 0 2.35 6.2 0 -5.3 21.4 0 0.1
  [4,0,16.8,0,2,9.3,0,2.35,6.2,0,-5.3,21.4,0,0.1],
// 3 0 -7.9 0 6.35 -7.1 0 5.6 1.2 0 6.05
  [3,0,-7.9,0,6.35,-7.1,0,5.6,1.2,0,6.05],
// 3 0 1.2 0 6.05 -7.1 0 5.6 -5.5 0 4.05
  [3,0,1.2,0,6.05,-7.1,0,5.6,-5.5,0,4.05],
// 3 0 0.4 0 -4.8 -0.4 0 -5.5 6.2 0 -5.3
  [3,0,0.4,0,-4.8,-0.4,0,-5.5,6.2,0,-5.3],
// 3 0 1.9 0 -3.2 0.4 0 -4.8 6.2 0 -5.3
  [3,0,1.9,0,-3.2,0.4,0,-4.8,6.2,0,-5.3],
// 4 16 -12.45 0 5.85 -7.1 0 5.6 -7.9 0 6.35 -15.9 0 8.35
  [4,16,-12.45,0,5.85,-7.1,0,5.6,-7.9,0,6.35,-15.9,0,8.35],
// 3 16 -15.9 0 8.35 -7.9 0 6.35 -9.4 0 7.8
  [3,16,-15.9,0,8.35,-7.9,0,6.35,-9.4,0,7.8],
// 3 16 0.4 0 -4.8 -12.4 0 -5 -0.4 0 -5.5
  [3,16,0.4,0,-4.8,-12.4,0,-5,-0.4,0,-5.5],
// 4 16 -1.9 0 -6.95 -0.4 0 -5.5 -12.4 0 -5 -15.9 0 -7.2
  [4,16,-1.9,0,-6.95,-0.4,0,-5.5,-12.4,0,-5,-15.9,0,-7.2],
// 4 16 -15.9 0 -7.2 -22.8 0 -7.5 -26.04 0 -9.5 -1.9 0 -6.95
  [4,16,-15.9,0,-7.2,-22.8,0,-7.5,-26.04,0,-9.5,-1.9,0,-6.95],
// 4 16 6.4 0 -6.8 -1.9 0 -6.95 -26.04 0 -9.5 30 0 -10
  [4,16,6.4,0,-6.8,-1.9,0,-6.95,-26.04,0,-9.5,30,0,-10],
// 3 16 25.6 0 0.05 6.4 0 -6.8 30 0 -10
  [3,16,25.6,0,0.05,6.4,0,-6.8,30,0,-10],
// 3 16 30 0 10 25.6 0 0.05 30 0 -10
  [3,16,30,0,10,25.6,0,0.05,30,0,-10],
// 3 16 30 0 10 16.9 0 3.45 25.6 0 0.05
  [3,16,30,0,10,16.9,0,3.45,25.6,0,0.05],
// 4 16 9.65 0 3.8 16.9 0 3.45 30 0 10 1.5 0 7.5
  [4,16,9.65,0,3.8,16.9,0,3.45,30,0,10,1.5,0,7.5],
// 4 16 -9.4 0 7.8 1.5 0 7.5 30 0 10 -15.9 0 8.35
  [4,16,-9.4,0,7.8,1.5,0,7.5,30,0,10,-15.9,0,8.35],
// 4 16 -26.04 0 9.5 -24 0 8.5 -15.9 0 8.35 30 0 10
  [4,16,-26.04,0,9.5,-24,0,8.5,-15.9,0,8.35,30,0,10],
// 4 16 -30 0 10 -30 0 -10 -29.5 0 -9.5 -29.5 0 9.5
  [4,16,-30,0,10,-30,0,-10,-29.5,0,-9.5,-29.5,0,9.5],
// 4 16 -26.04 0 -9.5 -29.5 0 -9.5 -30 0 -10 30 0 -10
  [4,16,-26.04,0,-9.5,-29.5,0,-9.5,-30,0,-10,30,0,-10],
// 4 16 -30 0 10 -29.5 0 9.5 -26.04 0 9.5 30 0 10
  [4,16,-30,0,10,-29.5,0,9.5,-26.04,0,9.5,30,0,10],
];
module ldraw_lib__63864p0a(step=0, col=false, unit=2/5, alt=false, line=0.2, solid=!$preview)
    makepoly(ldraw_lib__63864p0a(), step=step, col=col, unit=unit, alt=alt, line=line, solid=solid);
ldraw_lib__63864p0a(line=0.2);
